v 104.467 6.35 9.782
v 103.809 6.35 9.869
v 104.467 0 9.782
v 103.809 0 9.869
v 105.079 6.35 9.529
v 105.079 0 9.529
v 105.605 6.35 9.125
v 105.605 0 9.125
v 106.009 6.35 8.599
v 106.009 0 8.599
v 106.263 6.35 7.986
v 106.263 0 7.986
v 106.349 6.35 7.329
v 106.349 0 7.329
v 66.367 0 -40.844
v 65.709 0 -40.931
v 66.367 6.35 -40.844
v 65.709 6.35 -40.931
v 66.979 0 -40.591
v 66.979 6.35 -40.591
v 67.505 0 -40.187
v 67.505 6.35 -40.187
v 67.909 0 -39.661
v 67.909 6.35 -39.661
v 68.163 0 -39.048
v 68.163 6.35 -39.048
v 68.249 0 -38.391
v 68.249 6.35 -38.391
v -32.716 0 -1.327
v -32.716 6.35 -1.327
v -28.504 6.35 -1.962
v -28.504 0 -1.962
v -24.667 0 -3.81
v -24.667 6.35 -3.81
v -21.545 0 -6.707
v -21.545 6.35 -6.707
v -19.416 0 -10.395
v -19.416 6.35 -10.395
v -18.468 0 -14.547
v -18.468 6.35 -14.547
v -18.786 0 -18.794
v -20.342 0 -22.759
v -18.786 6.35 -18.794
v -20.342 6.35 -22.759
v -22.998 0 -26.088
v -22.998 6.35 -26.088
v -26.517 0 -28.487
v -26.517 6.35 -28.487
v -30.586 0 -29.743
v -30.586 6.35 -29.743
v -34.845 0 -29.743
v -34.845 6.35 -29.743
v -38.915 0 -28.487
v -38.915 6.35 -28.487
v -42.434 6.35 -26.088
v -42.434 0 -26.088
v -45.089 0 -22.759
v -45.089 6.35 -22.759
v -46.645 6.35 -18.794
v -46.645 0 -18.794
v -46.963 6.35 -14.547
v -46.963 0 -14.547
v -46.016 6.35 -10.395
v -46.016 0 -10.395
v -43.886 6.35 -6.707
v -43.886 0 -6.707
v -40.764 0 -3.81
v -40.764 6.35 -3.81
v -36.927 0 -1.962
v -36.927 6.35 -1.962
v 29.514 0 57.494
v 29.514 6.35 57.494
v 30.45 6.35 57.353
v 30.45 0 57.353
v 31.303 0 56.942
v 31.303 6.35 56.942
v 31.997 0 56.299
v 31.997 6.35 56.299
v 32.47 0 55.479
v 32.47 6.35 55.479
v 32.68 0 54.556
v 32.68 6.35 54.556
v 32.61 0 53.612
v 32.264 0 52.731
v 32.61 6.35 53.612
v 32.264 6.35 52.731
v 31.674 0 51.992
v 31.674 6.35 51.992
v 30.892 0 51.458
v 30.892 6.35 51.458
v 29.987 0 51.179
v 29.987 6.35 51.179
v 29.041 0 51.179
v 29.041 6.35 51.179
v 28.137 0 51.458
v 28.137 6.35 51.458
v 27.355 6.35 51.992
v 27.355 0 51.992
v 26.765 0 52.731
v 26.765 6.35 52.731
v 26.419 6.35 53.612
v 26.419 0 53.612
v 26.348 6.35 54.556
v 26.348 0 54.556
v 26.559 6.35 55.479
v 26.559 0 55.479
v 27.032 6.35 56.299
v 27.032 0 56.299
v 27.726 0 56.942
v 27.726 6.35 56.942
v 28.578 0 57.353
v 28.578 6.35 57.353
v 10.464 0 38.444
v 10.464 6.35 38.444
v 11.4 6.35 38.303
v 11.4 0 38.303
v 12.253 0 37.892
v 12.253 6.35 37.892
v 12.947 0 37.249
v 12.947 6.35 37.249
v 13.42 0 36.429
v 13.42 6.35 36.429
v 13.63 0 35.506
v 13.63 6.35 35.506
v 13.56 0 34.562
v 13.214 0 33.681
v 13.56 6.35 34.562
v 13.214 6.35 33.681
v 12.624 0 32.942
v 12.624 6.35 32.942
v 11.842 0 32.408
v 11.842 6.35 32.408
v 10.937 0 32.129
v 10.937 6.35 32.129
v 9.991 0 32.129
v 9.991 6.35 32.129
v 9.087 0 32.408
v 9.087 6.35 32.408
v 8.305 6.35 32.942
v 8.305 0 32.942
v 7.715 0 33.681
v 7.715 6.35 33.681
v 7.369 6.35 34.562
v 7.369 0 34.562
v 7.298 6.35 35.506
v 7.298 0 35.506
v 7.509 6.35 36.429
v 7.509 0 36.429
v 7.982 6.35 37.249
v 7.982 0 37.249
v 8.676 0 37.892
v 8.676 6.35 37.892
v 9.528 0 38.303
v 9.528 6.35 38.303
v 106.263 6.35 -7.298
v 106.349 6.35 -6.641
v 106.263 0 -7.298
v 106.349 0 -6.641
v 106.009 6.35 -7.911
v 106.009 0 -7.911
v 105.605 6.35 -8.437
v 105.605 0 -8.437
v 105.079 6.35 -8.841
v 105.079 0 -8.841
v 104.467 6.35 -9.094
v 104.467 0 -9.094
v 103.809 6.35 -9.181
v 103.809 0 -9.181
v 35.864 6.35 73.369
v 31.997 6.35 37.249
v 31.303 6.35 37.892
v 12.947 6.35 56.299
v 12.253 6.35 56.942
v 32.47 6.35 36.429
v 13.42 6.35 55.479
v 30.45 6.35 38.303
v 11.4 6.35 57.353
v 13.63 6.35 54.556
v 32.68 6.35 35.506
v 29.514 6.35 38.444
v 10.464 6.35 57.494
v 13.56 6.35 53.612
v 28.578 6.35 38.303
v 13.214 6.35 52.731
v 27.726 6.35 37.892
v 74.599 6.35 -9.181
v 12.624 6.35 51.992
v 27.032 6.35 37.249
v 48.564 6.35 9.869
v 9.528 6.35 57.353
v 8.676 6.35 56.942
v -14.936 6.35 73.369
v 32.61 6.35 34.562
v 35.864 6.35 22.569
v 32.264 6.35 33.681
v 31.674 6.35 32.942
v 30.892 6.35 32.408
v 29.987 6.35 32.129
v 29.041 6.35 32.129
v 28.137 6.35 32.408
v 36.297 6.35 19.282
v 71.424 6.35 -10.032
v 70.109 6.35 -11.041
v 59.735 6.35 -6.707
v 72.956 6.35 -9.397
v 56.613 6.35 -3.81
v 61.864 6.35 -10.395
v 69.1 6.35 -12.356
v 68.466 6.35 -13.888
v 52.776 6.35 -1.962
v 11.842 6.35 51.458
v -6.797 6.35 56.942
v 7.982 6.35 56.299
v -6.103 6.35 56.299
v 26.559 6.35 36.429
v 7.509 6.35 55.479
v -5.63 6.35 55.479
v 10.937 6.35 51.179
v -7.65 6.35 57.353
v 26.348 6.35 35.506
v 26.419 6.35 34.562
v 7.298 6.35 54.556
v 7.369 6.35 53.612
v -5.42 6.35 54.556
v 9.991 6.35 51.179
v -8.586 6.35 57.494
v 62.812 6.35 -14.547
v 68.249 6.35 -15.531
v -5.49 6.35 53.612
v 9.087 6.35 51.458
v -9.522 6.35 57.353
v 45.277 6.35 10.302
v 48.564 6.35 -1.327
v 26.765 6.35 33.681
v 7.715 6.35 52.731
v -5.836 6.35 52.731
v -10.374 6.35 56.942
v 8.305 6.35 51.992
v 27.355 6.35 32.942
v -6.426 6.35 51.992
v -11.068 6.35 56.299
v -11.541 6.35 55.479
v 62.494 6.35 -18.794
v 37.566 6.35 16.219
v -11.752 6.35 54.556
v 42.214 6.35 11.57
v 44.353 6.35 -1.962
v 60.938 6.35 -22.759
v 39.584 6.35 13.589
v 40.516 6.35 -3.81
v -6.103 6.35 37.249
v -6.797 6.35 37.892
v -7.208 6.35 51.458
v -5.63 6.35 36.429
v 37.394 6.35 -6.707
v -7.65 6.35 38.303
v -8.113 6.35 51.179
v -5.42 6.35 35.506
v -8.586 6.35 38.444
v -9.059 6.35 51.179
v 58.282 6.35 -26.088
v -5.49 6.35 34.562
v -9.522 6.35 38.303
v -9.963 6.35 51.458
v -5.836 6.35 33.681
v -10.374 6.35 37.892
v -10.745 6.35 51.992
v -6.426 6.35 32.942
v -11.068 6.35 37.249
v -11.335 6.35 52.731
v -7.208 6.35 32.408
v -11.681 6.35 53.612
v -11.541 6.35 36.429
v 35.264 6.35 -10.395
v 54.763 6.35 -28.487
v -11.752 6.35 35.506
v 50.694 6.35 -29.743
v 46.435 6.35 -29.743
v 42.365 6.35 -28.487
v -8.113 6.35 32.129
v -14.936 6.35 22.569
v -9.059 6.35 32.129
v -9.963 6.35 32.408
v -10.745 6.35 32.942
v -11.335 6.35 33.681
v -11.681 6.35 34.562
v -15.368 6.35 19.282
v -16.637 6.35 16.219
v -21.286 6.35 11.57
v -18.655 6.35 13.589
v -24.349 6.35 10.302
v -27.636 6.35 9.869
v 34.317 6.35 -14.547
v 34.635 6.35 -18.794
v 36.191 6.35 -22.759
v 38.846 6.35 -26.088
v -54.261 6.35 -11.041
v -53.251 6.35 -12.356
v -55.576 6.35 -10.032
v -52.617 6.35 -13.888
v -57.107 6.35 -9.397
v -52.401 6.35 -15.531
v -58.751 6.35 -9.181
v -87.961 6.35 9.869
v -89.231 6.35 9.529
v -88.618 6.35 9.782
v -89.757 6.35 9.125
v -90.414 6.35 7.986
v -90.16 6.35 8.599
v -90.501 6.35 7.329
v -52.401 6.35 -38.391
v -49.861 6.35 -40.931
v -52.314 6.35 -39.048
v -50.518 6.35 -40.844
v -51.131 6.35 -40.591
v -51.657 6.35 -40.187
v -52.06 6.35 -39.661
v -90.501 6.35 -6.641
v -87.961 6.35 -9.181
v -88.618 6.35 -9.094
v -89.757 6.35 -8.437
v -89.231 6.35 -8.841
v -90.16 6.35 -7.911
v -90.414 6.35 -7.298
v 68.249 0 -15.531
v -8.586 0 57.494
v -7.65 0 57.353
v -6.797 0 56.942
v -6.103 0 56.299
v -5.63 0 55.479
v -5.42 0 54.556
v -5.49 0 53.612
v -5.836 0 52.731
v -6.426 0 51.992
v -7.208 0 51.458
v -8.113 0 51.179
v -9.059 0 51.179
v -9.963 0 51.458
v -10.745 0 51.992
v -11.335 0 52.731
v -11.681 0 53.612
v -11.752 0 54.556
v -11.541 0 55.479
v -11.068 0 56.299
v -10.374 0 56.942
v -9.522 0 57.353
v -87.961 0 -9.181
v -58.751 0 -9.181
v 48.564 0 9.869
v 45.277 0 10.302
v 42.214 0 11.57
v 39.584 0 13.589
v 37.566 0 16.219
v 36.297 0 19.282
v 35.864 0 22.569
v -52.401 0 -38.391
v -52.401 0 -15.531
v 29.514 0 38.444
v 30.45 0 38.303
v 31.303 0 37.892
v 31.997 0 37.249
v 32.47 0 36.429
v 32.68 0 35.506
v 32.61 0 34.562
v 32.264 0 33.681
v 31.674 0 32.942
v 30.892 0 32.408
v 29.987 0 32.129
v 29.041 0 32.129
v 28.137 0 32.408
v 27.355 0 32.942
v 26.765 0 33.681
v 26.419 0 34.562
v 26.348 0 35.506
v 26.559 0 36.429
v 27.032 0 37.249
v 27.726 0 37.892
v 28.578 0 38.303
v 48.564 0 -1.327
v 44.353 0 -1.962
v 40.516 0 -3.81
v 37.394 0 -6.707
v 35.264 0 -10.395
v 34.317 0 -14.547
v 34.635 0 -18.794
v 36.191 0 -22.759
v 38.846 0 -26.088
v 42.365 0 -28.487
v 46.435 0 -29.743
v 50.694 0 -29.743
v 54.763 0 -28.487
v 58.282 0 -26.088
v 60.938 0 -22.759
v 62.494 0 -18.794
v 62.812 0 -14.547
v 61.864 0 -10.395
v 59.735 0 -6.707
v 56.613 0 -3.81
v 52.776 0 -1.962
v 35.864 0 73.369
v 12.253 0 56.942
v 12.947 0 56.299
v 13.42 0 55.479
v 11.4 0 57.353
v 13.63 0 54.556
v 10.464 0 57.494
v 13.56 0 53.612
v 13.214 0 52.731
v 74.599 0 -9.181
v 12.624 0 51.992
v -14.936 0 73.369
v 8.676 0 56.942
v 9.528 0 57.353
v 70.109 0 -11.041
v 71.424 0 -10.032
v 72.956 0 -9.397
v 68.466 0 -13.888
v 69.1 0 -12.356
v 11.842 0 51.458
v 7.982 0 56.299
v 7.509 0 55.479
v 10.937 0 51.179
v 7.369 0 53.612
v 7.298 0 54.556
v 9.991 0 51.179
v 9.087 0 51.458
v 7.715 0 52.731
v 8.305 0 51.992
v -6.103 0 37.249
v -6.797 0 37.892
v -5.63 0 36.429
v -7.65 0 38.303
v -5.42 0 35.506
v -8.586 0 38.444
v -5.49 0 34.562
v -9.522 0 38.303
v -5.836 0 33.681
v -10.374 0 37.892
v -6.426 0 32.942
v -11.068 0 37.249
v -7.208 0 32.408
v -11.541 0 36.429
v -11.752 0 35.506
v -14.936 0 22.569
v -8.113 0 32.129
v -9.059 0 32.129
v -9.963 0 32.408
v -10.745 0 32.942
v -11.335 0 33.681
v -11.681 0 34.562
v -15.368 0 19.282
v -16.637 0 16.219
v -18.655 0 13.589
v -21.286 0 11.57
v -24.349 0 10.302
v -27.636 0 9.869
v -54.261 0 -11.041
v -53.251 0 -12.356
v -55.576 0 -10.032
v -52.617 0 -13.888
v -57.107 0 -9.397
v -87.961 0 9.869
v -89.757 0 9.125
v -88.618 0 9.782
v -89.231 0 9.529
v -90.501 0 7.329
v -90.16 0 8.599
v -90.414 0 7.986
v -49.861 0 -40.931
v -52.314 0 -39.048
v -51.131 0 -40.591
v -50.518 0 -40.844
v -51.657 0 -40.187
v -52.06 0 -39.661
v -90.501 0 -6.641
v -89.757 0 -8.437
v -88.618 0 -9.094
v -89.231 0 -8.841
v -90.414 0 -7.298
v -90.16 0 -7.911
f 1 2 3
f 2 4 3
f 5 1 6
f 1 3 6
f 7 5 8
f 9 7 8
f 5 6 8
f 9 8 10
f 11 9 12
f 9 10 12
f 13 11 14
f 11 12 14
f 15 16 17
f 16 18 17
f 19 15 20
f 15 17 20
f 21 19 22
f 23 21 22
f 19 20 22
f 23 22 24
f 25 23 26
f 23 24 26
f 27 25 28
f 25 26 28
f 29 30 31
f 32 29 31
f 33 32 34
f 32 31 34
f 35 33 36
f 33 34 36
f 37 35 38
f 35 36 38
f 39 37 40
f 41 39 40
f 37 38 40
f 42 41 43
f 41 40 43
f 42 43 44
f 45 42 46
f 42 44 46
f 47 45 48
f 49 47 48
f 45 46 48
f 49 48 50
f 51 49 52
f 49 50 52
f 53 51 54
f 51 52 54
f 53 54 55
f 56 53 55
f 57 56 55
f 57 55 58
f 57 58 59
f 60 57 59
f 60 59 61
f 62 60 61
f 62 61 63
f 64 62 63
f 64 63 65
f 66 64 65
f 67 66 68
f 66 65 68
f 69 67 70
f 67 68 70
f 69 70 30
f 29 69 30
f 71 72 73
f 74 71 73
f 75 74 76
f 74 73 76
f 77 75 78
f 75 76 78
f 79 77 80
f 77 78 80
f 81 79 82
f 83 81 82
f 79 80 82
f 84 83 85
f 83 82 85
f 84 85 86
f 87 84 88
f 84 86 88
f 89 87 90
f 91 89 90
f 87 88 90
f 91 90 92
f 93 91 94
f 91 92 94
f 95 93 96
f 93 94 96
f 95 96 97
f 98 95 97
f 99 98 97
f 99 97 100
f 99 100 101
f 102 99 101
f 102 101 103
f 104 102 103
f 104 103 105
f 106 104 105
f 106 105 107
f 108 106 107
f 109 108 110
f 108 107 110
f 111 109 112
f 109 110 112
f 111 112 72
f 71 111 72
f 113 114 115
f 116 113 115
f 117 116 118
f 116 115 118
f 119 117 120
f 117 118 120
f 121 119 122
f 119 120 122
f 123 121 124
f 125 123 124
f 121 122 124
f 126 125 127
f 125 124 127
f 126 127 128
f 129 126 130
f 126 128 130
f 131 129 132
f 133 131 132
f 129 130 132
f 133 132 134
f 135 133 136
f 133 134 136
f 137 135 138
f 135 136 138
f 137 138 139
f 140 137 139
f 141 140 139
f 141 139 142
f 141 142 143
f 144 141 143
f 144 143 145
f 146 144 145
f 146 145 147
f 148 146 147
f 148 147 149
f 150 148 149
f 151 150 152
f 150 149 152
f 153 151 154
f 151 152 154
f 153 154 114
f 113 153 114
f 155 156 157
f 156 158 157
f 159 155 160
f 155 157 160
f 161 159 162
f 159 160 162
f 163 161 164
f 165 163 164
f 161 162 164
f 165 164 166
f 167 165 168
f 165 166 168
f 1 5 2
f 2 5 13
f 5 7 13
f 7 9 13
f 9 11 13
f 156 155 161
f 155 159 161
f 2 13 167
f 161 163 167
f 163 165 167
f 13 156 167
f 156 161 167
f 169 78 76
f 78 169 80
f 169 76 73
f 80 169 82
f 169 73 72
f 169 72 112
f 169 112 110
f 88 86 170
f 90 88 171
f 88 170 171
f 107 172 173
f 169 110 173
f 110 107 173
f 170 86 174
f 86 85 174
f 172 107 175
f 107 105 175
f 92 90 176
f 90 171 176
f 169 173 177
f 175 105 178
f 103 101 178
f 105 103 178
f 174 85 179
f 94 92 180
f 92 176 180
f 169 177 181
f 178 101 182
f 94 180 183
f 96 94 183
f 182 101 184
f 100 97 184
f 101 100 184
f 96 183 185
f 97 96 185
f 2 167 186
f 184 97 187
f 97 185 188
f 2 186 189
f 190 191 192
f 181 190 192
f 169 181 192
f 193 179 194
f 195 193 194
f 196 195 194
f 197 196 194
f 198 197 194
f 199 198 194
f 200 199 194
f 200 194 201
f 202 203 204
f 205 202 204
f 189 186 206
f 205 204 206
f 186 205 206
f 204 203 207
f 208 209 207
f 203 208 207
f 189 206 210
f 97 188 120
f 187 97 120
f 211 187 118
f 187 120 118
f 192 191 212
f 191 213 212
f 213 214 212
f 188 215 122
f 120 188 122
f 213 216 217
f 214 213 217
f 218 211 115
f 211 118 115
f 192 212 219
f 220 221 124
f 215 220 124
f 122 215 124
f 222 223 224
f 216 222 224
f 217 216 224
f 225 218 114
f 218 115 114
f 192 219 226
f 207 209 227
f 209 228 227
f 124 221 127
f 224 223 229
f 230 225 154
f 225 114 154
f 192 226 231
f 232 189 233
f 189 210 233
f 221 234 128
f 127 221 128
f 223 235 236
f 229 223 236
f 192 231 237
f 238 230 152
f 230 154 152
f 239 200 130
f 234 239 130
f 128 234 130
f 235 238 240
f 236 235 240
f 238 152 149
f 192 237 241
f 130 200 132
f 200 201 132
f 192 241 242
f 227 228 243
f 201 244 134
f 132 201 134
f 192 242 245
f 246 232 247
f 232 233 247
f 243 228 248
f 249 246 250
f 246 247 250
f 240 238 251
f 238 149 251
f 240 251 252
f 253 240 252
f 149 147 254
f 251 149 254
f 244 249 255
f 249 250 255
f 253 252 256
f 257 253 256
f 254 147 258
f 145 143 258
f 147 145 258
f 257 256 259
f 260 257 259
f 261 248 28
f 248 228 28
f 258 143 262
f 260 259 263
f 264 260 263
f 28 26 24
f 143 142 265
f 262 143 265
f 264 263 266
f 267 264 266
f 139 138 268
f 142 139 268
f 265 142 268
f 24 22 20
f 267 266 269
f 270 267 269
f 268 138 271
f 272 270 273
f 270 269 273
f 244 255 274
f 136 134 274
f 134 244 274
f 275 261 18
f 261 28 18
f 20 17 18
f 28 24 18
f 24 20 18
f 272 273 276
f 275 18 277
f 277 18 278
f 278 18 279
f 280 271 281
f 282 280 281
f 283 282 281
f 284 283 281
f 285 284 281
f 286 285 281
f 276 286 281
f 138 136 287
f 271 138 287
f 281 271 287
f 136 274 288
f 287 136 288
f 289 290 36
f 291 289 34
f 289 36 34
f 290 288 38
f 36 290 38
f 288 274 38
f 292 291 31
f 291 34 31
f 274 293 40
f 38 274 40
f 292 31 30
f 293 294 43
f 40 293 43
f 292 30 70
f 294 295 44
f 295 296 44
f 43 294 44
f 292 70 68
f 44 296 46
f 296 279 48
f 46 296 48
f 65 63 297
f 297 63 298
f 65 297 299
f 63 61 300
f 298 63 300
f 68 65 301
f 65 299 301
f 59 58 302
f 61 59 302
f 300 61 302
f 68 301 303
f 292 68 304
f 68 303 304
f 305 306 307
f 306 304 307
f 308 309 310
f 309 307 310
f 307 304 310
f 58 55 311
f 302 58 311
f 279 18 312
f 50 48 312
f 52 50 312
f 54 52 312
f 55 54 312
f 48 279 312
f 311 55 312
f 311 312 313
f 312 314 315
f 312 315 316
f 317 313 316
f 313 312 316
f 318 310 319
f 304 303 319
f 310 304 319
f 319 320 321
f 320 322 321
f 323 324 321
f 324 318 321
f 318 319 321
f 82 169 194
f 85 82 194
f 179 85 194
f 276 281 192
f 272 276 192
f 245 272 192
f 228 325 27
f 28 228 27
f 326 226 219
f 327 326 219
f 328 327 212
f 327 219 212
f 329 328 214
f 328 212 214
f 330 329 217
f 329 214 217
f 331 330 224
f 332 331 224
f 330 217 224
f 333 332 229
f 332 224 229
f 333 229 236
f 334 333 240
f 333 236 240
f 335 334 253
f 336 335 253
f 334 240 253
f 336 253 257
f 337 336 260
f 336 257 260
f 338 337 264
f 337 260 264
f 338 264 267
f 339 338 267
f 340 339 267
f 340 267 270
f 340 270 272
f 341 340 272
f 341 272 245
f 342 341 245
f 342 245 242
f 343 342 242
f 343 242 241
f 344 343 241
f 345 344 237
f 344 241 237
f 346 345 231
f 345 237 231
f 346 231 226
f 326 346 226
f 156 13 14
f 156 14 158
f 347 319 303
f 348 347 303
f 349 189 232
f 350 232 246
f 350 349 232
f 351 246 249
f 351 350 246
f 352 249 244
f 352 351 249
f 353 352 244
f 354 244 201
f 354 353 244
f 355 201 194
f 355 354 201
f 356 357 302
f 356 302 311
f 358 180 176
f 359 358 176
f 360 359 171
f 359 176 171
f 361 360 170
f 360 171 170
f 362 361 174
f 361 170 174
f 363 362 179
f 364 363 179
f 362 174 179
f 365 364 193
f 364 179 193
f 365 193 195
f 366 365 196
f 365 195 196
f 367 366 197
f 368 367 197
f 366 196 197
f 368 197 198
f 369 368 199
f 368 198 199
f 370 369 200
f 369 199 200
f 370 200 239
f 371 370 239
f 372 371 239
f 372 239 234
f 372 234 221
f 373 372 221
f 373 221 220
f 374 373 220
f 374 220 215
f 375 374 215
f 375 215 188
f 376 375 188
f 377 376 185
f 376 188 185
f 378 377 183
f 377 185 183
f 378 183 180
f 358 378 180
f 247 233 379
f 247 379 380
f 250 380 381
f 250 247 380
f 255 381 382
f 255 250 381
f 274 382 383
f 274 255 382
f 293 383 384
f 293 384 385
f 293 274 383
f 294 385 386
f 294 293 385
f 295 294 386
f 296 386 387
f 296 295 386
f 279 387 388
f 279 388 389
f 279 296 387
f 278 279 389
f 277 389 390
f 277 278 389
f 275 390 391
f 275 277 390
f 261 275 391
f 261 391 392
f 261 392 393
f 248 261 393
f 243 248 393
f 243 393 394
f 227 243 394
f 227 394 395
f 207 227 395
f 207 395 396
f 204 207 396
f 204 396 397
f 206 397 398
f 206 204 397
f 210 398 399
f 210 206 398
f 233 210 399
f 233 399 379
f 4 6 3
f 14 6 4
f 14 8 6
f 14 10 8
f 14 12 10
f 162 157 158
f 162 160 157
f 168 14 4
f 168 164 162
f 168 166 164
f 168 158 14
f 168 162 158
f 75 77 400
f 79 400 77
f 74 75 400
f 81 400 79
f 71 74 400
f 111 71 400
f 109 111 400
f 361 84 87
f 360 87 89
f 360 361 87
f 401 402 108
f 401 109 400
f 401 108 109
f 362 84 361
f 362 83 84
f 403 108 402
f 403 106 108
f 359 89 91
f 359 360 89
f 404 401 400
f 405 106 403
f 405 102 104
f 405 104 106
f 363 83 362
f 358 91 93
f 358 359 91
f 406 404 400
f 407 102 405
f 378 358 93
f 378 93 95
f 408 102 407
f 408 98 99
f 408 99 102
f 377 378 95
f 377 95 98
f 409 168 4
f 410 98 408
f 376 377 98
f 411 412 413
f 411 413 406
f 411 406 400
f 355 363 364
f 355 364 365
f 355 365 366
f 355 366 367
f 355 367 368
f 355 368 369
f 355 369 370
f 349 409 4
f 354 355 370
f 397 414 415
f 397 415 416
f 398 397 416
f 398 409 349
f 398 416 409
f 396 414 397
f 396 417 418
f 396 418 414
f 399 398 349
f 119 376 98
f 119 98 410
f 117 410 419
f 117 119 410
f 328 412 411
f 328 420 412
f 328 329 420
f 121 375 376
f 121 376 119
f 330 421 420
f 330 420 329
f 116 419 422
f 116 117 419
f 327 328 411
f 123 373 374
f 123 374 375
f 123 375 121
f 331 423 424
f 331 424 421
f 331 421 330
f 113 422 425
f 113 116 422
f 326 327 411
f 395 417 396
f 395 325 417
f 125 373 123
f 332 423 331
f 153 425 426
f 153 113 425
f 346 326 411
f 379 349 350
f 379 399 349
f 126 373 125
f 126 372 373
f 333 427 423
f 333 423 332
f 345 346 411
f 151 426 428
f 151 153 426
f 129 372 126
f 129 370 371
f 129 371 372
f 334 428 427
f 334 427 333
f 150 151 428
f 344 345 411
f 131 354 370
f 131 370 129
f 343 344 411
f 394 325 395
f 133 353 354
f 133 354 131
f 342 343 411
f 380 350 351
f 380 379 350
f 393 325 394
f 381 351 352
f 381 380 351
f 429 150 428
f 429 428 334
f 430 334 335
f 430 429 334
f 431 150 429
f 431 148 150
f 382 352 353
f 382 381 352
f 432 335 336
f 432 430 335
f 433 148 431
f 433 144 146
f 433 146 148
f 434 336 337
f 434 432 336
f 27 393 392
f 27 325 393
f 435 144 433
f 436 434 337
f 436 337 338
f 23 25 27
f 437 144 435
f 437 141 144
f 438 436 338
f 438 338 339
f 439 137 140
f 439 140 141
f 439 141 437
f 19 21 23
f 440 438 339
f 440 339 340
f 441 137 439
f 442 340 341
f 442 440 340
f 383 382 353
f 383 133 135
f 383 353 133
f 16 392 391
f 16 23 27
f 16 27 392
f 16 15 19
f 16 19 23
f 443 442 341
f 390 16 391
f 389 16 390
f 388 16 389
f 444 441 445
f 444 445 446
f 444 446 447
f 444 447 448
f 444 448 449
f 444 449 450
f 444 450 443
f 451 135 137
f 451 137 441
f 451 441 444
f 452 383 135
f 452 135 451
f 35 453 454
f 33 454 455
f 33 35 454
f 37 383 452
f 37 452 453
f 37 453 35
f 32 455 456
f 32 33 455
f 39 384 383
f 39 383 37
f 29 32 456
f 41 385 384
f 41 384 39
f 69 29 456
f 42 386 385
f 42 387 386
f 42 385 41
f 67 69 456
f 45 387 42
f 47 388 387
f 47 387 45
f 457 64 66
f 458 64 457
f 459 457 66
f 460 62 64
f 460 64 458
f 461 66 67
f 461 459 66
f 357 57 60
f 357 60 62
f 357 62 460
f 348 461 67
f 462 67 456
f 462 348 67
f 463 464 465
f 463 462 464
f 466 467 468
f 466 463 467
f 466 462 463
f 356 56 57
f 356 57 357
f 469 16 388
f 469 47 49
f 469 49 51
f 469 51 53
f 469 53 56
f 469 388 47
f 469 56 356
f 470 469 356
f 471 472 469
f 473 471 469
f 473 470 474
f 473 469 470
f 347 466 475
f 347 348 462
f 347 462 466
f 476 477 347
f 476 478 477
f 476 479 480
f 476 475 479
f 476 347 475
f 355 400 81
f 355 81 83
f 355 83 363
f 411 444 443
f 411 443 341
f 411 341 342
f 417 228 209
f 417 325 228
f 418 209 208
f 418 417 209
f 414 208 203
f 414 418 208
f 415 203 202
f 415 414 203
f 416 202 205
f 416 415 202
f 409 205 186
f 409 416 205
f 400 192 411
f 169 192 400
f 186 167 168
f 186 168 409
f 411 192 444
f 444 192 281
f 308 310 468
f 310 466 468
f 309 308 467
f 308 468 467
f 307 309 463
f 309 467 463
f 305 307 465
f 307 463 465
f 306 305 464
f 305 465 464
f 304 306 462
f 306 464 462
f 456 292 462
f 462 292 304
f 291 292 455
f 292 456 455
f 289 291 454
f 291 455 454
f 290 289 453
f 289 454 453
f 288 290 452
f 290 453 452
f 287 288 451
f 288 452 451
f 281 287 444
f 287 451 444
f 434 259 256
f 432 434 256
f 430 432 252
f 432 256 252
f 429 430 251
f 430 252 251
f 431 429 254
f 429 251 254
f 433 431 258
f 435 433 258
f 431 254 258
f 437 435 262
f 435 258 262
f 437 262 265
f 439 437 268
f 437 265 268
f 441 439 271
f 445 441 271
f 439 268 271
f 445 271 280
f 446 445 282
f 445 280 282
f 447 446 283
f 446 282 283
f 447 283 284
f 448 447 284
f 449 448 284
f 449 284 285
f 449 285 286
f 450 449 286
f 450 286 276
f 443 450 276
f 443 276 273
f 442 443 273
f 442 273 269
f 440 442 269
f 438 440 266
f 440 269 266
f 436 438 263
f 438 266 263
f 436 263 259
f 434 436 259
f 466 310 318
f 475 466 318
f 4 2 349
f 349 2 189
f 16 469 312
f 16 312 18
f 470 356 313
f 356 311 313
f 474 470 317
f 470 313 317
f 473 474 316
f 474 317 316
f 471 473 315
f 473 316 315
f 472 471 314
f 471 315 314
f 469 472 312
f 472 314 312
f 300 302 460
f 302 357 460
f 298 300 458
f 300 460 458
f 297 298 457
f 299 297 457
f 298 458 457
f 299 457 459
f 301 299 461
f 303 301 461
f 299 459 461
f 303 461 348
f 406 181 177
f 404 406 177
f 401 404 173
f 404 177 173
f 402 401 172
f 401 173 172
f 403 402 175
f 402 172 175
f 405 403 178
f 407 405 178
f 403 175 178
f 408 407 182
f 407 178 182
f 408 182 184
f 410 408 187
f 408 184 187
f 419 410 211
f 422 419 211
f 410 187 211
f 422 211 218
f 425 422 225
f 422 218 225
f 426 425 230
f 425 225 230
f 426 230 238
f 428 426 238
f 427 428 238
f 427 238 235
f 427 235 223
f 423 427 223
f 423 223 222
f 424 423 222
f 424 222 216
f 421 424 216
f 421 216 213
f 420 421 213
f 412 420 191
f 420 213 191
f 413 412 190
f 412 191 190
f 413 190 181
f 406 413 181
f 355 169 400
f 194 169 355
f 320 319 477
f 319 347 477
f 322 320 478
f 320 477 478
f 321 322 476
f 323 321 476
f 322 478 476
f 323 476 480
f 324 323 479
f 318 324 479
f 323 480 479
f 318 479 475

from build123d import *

# Parameters (mm, degrees)
SKETCH2_W            = 120.65
SKETCH2_H            = 50.8
BOSS_EXTRUDE1_DEPTH  = 6.35
SKETCH3_R            = 14.2875
CUT_EXTRUDE1_DEPTH   = 6.35
SKETCH6_W            = 38.1
SKETCH6_H            = 19.05
BOSS_EXTRUDE2_DEPTH  = 6.35
FILLET2_R            = 6.35
FILLET1_R            = 2.54
SKETCH8_W            = 50.8
SKETCH8_H            = 63.5
BOSS_EXTRUDE3_DEPTH  = 6.35
FILLET3_R            = 12.7
SKETCH9_R            = 3.175
CUT_EXTRUDE2_DEPTH   = 6.35
LPATTERN1_COUNT      = 3
LPATTERN1_PITCH      = 19.05
LPATTERN1_COUNT_DIR2 = 2
LPATTERN1_PITCH_DIR2 = 19.05


with BuildPart() as part:
    # Sketch2 → Boss-Extrude1 (new body)
    with BuildSketch(Plane(origin=(0, 0, 0), x_dir=(1, 0, 0), z_dir=(0, 1, 0))):
        with Locations((7.924270833, 15.531041667)):
            Rectangle(SKETCH2_W, SKETCH2_H)
    extrude(amount=BOSS_EXTRUDE1_DEPTH)

    # Sketch3 → Cut-Extrude1 (cut)
    with BuildSketch(Plane(origin=(0, 6.35, 0), x_dir=(1, 0, 0), z_dir=(0, 1, 0))):
        with Locations(Location((-32.715729167, 15.61478805, 0), (0, 0, 270))):
            Circle(SKETCH3_R)
    cut_extrude1 = extrude(amount=-CUT_EXTRUDE1_DEPTH, mode=Mode.SUBTRACT)

    # Mirror1: Cut-Extrude1 across plane
    add(cut_extrude1.mirror(Plane(origin=(7.924270833, 0, 0), x_dir=(0, 0, 1), z_dir=(1, 0, 0))), mode=Mode.SUBTRACT)

    # Sketch6 → Boss-Extrude2 (add)
    with BuildSketch(Plane(origin=(0, 6.35, 0), x_dir=(1, 0, 0), z_dir=(0, 1, 0))):
        with Locations((-71.450729167, -0.343958333)):
            Rectangle(SKETCH6_W, SKETCH6_H)
    boss_extrude2 = extrude(amount=-BOSS_EXTRUDE2_DEPTH)

    # Mirror2: Boss-Extrude2 across plane
    add(boss_extrude2.mirror(Plane(origin=(7.924270833, 0, 0), x_dir=(0, 0, 1), z_dir=(1, 0, 0))))

    # Fillet2
    fillet2_edges = [part.edges().sort_by_distance(p)[0] for p in [
        (-52.400729167, 3.175, -9.181041667),
        (68.249270833, 3.175, -9.181041667),
    ]]
    fillet(fillet2_edges, radius=FILLET2_R)

    # Fillet1
    fillet1_edges = [part.edges().sort_by_distance(p)[0] for p in [
        (-90.500729167, 3.175, 9.868958333),
        (-90.500729167, 3.175, -9.181041667),
        (106.349270833, 3.175, -9.181041667),
        (106.349270833, 3.175, 9.868958333),
        (-52.400729167, 3.175, -40.931041667),
        (68.249270833, 3.175, -40.931041667),
    ]]
    fillet(fillet1_edges, radius=FILLET1_R)

    # Sketch8 → Boss-Extrude3 (add)
    with BuildSketch(Plane(origin=(0, 6.35, 0), x_dir=(1, 0, 0), z_dir=(0, 1, 0))):
        with Locations((10.464270833, -41.618958333)):
            Rectangle(SKETCH8_W, SKETCH8_H)
    extrude(amount=-BOSS_EXTRUDE3_DEPTH)

    # Fillet3
    fillet3_edges = [part.edges().sort_by_distance(p)[0] for p in [
        (-14.935729167, 3.175, 9.868958333),
        (35.864270833, 3.175, 9.868958333),
    ]]
    fillet(fillet3_edges, radius=FILLET3_R)

    # Sketch9 → Cut-Extrude2 (cut)
    with BuildSketch(Plane(origin=(0, 6.35, 0), x_dir=(1, 0, 0), z_dir=(0, 1, 0))):
        with Locations(Location((-8.585729167, -54.318958333, 0), (0, 0, 270))):
            Circle(SKETCH9_R)
    cut_extrude2 = extrude(amount=-CUT_EXTRUDE2_DEPTH, mode=Mode.SUBTRACT)

    # LPattern1: Cut-Extrude2 3 × 2
    with Locations(*[(i * LPATTERN1_PITCH, 0, -j * LPATTERN1_PITCH_DIR2) for i in range(LPATTERN1_COUNT) for j in range(LPATTERN1_COUNT_DIR2) if (i, j) != (0, 0)]):
        add(cut_extrude2, mode=Mode.SUBTRACT)


solid = part.part
